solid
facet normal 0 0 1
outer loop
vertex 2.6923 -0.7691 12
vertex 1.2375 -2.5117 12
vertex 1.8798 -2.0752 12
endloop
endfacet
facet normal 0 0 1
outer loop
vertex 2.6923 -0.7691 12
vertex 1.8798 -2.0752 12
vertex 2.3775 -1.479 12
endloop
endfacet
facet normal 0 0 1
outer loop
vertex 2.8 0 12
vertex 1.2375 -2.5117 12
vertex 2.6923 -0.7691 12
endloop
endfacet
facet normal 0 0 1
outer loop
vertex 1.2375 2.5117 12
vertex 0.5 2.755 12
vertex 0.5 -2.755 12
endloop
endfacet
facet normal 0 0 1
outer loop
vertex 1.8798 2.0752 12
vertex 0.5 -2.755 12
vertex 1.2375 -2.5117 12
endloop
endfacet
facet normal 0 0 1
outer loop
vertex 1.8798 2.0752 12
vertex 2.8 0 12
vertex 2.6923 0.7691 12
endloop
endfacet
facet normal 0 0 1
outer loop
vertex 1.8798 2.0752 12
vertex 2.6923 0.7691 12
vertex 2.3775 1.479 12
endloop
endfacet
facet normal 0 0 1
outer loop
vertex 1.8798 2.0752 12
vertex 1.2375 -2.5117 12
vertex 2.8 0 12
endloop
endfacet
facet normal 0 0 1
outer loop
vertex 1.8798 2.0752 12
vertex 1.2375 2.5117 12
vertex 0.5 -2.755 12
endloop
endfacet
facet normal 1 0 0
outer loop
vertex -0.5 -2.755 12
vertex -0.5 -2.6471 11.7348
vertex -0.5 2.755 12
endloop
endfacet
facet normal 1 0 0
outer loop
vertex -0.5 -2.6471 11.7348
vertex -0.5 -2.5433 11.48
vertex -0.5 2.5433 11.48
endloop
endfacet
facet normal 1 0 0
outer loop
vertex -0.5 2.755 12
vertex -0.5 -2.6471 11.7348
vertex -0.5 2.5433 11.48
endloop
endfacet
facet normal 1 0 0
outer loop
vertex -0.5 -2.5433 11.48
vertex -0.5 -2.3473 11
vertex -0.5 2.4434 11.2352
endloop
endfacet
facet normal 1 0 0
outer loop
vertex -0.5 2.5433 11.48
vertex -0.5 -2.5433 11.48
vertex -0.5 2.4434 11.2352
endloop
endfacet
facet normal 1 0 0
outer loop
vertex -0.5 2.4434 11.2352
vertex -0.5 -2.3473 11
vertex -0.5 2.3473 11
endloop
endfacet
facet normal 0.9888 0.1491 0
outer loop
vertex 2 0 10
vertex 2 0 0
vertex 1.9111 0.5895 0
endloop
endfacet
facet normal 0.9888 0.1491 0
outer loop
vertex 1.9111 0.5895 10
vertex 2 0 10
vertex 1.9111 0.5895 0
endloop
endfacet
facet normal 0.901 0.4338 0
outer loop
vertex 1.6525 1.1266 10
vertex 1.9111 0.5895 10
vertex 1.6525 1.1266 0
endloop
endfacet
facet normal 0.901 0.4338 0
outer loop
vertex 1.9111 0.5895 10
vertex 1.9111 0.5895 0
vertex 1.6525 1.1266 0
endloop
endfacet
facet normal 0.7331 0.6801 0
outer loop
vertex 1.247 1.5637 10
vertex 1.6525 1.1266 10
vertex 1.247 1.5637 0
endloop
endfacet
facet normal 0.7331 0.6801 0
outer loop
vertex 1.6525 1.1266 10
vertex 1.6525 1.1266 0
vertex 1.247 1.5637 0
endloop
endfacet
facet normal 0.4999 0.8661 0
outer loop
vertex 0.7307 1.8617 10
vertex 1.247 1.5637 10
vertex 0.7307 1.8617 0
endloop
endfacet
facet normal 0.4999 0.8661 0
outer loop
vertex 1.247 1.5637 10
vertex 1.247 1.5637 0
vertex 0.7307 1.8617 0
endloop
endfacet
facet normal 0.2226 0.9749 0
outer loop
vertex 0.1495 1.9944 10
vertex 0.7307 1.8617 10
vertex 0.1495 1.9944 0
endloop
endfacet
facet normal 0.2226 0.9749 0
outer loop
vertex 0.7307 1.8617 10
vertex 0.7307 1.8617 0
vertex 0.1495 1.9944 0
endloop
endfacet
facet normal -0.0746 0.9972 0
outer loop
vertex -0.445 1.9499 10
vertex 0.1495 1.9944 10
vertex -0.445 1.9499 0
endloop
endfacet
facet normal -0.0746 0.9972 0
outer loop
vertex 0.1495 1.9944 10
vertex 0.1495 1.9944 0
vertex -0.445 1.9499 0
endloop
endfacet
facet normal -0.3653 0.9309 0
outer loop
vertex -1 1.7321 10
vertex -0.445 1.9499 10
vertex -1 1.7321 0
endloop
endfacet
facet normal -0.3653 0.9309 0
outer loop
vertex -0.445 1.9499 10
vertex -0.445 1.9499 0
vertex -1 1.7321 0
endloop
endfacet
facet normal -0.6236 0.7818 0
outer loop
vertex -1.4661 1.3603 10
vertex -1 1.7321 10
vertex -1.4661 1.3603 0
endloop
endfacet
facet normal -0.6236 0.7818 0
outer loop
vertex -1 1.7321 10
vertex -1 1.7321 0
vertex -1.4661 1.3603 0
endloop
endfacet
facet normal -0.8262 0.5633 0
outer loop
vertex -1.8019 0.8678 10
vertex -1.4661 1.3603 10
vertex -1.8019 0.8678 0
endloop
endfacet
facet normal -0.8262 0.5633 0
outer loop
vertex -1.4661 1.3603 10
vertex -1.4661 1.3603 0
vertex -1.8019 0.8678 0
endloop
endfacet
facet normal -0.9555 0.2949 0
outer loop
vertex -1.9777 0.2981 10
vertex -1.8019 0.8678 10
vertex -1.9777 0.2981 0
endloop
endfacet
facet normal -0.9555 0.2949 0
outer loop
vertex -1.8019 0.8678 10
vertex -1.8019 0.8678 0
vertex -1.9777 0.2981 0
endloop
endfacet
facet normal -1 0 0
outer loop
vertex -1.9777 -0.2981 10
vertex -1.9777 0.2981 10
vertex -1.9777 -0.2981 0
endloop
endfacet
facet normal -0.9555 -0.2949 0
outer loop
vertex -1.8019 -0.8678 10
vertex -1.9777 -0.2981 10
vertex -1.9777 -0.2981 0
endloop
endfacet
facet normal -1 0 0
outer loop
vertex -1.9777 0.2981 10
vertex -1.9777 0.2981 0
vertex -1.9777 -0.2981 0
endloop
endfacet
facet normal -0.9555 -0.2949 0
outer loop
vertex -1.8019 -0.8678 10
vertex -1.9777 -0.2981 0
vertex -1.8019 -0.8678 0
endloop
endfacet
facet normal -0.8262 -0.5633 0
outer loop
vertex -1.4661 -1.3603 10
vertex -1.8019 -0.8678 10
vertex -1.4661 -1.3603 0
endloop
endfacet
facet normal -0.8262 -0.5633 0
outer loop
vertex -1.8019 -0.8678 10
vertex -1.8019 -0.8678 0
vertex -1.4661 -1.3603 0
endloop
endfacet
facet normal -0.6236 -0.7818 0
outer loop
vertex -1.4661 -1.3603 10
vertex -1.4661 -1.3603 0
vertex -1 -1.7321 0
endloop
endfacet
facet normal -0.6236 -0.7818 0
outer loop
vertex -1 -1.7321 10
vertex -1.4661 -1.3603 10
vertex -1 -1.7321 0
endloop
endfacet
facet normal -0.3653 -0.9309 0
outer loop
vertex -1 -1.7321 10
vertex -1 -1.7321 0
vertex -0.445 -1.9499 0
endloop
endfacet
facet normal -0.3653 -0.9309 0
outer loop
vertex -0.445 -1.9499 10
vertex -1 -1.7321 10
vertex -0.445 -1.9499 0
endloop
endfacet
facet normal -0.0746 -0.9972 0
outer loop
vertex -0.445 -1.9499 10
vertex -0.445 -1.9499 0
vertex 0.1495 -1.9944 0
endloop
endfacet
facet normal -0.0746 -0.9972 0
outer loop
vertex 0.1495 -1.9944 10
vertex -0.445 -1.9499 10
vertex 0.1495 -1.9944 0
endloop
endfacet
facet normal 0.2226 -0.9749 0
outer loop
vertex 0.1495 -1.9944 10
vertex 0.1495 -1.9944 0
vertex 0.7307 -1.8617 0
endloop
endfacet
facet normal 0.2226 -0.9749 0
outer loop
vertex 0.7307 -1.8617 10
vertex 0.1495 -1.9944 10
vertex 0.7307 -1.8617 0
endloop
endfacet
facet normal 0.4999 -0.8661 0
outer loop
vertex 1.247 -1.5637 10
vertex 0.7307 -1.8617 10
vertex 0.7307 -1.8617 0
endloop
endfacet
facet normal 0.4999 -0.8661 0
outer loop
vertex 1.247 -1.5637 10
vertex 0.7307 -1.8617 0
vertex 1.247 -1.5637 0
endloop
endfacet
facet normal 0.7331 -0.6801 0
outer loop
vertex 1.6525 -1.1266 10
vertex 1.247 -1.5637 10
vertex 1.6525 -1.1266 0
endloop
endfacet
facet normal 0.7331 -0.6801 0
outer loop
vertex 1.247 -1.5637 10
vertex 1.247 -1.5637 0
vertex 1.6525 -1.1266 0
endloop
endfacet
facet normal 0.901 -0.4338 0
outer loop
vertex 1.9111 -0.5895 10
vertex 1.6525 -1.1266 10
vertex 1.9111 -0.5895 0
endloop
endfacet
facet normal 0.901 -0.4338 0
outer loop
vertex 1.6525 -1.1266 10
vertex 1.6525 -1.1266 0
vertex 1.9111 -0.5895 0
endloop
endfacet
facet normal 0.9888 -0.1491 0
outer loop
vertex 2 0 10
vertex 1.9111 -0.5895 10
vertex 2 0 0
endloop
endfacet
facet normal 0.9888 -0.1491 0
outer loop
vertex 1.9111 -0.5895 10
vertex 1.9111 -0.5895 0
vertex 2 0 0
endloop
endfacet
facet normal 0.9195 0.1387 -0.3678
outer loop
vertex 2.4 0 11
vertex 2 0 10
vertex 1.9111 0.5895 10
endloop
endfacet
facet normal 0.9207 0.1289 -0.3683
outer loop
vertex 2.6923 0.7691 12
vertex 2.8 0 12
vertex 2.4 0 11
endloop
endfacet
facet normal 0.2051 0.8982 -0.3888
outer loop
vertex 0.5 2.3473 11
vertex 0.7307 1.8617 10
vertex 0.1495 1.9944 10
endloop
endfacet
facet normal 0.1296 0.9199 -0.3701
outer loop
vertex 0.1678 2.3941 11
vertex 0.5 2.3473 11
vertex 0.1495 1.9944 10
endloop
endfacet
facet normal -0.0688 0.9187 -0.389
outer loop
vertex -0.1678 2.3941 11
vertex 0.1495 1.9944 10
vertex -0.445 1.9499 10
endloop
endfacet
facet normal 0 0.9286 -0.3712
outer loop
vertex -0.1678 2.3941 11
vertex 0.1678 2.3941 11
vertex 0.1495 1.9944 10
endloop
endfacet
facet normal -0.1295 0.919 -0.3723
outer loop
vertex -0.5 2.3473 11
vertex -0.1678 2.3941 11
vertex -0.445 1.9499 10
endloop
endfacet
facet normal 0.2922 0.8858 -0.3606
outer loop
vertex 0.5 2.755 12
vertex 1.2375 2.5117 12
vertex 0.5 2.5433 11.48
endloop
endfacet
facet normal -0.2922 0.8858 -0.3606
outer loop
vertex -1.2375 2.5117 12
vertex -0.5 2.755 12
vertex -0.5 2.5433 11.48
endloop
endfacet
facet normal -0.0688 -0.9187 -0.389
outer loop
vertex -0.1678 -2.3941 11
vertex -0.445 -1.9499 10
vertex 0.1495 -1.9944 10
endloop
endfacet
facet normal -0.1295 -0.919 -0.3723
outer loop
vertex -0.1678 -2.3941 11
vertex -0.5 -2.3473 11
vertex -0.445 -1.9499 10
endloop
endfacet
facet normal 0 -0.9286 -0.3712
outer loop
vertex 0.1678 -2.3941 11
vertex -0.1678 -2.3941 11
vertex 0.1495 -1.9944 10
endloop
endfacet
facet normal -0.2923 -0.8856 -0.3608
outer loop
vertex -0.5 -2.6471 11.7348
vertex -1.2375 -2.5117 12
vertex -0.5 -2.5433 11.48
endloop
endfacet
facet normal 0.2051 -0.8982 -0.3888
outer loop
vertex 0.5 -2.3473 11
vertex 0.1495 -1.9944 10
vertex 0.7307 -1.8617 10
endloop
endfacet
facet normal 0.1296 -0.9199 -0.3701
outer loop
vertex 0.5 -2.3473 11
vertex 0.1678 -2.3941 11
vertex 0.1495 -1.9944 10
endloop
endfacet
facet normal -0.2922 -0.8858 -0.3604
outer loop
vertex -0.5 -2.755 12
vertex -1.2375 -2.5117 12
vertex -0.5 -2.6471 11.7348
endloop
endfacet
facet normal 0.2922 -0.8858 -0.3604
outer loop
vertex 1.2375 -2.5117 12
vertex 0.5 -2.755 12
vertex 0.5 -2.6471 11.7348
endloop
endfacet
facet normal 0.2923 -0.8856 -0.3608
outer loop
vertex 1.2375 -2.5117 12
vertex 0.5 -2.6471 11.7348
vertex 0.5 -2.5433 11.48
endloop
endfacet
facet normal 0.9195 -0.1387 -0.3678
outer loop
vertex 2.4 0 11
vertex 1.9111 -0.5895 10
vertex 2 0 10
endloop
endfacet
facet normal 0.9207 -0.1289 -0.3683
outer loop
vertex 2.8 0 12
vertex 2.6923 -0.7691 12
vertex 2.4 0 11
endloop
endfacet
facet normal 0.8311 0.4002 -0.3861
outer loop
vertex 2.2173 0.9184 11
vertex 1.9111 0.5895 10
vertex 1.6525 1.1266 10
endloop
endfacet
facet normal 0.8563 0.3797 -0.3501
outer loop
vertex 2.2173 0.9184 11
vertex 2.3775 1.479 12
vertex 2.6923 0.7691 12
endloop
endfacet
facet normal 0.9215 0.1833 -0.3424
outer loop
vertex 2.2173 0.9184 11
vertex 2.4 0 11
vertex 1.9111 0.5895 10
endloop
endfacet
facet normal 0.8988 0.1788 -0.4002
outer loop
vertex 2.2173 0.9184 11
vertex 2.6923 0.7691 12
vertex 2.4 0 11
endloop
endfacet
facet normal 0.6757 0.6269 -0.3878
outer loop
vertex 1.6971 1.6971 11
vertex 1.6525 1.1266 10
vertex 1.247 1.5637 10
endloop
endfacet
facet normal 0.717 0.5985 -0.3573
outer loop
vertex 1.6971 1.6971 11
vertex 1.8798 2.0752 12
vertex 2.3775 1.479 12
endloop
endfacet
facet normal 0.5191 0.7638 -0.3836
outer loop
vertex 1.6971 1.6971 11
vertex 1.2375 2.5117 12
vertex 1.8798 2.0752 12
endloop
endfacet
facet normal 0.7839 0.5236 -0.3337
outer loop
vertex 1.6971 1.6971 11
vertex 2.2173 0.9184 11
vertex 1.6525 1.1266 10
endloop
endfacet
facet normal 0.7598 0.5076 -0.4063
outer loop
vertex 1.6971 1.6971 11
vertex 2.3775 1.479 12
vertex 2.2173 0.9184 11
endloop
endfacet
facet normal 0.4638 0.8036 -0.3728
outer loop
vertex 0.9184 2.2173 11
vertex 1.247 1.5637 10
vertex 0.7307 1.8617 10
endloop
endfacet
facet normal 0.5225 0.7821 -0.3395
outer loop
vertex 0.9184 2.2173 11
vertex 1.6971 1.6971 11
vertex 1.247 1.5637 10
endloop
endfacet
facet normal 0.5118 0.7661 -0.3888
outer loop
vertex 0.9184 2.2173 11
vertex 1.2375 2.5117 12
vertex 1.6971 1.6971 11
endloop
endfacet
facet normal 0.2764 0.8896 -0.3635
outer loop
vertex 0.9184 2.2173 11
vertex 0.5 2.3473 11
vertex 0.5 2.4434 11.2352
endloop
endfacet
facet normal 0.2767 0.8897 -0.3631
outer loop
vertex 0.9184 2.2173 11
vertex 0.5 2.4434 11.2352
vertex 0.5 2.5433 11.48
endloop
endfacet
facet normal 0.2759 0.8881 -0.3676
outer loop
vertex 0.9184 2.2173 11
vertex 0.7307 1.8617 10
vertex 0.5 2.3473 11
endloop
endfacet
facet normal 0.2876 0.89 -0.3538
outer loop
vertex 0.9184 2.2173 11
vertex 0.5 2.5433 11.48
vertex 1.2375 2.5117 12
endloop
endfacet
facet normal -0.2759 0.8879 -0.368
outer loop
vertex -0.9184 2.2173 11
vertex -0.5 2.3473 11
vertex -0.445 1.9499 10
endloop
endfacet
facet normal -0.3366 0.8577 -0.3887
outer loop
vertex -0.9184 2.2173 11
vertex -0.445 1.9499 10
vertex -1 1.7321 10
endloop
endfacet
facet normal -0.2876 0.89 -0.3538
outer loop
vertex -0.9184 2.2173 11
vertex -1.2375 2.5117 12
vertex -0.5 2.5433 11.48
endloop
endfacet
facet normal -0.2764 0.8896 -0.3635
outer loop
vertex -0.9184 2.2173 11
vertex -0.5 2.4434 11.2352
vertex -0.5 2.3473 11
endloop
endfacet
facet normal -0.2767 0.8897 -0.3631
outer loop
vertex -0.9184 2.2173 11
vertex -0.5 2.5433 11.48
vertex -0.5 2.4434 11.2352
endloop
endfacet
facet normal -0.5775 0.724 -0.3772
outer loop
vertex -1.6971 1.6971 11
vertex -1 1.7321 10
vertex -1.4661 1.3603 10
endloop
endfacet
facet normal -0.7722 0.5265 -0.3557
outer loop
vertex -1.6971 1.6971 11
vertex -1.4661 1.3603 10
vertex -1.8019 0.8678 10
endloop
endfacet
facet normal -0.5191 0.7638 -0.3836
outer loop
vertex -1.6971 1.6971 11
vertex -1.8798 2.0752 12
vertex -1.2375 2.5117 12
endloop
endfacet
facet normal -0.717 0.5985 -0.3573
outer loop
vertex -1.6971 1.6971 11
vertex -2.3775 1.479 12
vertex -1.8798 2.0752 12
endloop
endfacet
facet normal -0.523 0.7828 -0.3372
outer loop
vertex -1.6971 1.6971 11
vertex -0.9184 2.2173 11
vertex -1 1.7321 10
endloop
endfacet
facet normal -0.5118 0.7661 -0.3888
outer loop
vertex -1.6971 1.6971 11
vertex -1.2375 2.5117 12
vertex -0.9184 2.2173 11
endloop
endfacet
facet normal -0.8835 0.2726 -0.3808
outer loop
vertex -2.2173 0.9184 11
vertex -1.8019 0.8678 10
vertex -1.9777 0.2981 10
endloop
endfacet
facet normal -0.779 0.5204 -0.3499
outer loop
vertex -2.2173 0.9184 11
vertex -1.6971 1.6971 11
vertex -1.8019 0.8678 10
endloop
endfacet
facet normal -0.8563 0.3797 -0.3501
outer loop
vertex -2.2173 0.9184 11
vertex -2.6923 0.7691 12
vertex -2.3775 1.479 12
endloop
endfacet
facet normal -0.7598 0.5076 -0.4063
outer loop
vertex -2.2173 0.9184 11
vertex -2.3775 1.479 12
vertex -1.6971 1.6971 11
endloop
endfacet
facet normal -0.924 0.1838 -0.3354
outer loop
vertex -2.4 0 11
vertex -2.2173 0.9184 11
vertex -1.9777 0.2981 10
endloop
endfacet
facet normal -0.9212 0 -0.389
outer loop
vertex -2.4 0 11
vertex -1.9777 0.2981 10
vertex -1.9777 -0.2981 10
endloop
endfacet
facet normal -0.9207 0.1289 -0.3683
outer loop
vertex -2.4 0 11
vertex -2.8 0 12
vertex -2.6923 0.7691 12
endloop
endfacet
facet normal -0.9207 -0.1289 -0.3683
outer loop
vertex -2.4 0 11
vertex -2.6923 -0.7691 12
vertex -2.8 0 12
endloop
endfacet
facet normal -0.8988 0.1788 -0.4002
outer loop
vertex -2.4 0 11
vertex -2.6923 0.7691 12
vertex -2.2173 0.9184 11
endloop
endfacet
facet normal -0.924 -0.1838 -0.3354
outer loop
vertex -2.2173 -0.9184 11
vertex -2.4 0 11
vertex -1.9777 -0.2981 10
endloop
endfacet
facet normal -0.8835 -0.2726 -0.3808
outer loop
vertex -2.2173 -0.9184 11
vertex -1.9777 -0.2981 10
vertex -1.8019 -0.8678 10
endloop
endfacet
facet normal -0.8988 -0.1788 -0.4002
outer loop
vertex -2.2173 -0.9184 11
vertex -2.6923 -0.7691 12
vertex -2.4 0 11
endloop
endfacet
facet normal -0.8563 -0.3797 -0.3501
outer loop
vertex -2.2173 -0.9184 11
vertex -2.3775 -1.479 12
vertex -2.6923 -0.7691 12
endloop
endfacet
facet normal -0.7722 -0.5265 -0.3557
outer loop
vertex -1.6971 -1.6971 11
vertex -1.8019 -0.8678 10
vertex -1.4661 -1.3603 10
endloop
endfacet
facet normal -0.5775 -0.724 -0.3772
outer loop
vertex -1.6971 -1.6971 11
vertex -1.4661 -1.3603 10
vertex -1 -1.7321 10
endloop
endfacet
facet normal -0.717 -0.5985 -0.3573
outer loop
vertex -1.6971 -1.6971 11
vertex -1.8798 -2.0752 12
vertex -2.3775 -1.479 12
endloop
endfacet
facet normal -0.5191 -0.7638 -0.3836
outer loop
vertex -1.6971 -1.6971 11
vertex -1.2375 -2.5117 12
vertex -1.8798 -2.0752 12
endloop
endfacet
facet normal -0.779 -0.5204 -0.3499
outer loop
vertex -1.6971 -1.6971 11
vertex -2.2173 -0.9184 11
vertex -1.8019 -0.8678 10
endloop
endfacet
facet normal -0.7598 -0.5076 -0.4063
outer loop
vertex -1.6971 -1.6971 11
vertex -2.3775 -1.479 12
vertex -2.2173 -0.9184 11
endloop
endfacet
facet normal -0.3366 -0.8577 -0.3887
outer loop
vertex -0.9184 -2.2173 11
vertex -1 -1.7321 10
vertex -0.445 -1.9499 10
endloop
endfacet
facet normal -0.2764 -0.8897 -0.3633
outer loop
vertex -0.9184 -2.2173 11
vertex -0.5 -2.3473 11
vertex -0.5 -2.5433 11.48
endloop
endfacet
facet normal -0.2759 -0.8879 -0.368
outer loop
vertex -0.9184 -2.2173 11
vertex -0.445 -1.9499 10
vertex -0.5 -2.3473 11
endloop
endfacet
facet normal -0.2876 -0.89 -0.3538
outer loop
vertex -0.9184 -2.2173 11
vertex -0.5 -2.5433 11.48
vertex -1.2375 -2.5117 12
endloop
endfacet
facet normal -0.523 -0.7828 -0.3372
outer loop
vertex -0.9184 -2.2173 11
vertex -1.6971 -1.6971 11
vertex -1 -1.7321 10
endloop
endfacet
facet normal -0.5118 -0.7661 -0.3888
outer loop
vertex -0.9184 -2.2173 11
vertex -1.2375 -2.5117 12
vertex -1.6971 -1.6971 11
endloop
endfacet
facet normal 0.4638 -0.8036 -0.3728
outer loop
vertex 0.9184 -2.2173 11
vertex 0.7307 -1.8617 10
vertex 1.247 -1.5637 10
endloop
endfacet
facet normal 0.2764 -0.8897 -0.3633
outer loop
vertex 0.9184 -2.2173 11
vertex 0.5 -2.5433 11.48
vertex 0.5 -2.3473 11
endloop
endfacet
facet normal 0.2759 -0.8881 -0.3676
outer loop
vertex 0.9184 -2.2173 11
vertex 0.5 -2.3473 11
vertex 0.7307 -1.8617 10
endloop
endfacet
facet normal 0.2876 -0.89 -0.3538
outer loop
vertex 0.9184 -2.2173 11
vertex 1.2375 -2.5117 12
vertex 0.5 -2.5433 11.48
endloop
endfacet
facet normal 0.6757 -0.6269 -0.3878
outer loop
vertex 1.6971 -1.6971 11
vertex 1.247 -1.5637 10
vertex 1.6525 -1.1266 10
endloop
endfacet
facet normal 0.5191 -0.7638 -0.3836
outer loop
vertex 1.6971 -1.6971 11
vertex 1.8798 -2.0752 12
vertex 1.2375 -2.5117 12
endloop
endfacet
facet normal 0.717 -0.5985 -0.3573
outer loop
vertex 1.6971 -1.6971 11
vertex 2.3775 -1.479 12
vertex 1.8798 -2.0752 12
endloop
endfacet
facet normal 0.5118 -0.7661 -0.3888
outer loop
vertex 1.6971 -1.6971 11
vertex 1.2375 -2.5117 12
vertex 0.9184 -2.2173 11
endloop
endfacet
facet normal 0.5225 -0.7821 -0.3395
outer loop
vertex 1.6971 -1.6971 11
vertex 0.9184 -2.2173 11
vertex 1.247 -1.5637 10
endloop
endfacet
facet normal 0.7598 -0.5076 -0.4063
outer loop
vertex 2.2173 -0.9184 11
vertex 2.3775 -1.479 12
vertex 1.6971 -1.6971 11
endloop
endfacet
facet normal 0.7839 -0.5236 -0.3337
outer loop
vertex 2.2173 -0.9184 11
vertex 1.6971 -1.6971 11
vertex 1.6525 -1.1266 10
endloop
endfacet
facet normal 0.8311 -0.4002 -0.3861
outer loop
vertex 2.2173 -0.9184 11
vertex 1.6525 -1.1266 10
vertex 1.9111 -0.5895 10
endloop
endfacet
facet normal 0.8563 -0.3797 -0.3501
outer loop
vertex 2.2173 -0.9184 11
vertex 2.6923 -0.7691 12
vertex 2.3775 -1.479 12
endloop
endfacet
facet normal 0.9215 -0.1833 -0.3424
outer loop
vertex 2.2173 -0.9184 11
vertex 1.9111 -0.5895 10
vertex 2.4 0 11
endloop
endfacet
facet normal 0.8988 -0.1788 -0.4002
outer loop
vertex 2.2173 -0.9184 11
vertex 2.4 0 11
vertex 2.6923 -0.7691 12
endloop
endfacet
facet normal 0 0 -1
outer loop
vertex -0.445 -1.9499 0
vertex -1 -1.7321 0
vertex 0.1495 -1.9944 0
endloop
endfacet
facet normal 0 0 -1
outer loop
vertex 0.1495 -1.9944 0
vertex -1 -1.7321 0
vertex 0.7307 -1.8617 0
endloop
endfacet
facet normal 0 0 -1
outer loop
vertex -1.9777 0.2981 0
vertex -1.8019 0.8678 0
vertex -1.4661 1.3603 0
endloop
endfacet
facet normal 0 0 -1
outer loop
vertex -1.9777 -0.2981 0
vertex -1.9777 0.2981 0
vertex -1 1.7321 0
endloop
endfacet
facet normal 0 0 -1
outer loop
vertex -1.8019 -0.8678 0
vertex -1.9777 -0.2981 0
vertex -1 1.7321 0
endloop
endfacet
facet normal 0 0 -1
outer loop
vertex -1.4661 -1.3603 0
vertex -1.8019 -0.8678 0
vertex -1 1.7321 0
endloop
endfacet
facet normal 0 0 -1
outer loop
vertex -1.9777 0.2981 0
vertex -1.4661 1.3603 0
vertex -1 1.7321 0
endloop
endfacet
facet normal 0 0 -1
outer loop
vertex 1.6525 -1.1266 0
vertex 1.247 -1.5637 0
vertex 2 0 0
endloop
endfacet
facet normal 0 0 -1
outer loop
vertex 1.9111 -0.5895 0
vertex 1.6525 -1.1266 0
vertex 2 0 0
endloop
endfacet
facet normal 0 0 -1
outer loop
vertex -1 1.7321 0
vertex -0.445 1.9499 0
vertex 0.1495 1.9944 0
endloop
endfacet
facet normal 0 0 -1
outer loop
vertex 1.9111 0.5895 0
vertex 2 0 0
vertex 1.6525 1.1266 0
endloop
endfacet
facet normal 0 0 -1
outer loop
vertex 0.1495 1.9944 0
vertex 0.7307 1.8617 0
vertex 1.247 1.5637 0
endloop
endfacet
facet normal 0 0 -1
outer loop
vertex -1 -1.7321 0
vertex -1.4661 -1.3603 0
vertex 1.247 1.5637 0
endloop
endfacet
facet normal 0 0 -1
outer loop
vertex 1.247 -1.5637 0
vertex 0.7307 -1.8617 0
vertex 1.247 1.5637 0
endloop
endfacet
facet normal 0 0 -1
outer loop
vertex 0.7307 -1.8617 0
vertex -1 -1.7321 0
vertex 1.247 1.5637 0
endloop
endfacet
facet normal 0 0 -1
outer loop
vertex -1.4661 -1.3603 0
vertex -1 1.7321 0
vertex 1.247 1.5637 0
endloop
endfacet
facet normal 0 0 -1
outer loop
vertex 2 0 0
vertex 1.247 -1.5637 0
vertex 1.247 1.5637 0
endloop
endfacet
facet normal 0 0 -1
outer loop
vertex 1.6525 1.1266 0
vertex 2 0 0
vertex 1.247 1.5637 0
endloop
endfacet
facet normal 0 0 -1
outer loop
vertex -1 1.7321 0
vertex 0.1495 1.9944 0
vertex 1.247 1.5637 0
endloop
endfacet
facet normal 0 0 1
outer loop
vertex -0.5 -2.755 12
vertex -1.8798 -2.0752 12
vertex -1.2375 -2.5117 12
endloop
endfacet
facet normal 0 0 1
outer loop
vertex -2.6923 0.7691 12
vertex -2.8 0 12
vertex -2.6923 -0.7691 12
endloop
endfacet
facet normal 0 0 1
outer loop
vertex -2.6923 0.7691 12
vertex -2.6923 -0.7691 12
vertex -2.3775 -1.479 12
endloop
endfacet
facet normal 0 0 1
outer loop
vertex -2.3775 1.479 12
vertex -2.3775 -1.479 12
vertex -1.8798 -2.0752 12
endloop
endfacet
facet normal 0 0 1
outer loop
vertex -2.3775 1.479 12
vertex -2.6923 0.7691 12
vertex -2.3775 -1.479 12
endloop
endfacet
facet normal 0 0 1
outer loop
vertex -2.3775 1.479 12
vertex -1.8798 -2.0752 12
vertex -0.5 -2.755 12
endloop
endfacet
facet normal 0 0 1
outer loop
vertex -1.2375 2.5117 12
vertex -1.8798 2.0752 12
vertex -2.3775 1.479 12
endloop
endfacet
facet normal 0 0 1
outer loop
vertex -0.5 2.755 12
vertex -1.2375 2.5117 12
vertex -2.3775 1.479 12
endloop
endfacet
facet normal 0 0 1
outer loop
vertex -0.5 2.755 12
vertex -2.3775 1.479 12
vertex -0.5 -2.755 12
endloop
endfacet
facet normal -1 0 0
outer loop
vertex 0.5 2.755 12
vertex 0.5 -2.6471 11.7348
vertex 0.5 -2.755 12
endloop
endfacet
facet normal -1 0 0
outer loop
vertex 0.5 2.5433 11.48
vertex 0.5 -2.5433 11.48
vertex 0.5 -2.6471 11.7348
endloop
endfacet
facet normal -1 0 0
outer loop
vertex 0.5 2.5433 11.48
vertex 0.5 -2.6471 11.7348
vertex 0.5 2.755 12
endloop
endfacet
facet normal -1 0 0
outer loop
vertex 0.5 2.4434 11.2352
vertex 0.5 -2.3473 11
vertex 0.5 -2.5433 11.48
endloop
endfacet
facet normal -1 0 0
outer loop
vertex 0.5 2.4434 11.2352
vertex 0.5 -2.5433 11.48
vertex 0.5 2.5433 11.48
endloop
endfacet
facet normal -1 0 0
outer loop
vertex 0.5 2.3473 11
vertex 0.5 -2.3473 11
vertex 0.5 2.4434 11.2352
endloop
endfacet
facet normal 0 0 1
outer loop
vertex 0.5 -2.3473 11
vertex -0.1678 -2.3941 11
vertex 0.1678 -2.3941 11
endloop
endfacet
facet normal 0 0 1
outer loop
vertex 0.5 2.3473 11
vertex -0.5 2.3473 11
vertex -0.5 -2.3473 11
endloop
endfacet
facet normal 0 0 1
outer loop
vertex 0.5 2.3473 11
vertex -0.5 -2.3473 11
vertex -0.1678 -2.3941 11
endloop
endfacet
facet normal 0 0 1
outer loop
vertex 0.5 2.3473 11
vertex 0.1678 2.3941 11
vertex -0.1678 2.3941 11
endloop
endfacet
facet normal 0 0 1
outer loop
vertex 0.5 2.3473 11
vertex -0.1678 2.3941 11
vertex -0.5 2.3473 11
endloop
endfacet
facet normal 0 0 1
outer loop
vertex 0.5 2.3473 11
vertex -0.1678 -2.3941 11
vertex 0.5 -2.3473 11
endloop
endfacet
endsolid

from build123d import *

# Parameters (mm, degrees)
BOX_W          = 1
BOX_H          = 10
BOX_DEPTH      = 4
CYLINDER_R     = 2
CYLINDER_DEPTH = 10


with BuildPart() as cub:
    # Box → Box (new body)
    with BuildSketch(Plane(origin=(-0.5, -6, 11), x_dir=(1, 0, 0), z_dir=(0, 0, 1))):
        with Locations((0.5, 5)):
            Rectangle(BOX_W, BOX_H)
    extrude(amount=BOX_DEPTH)


with BuildPart() as cilindre:
    # Cylinder → Cylinder (new body)
    with BuildSketch(Plane.XY):
        Circle(CYLINDER_R)
    extrude(amount=CYLINDER_DEPTH)


with BuildPart() as cut:
    # Cone → Cone (revolve)
    with BuildSketch(Plane(origin=(0, 0, 10), x_dir=(1, 0, 0), z_dir=(0, -1, 0))):
        Polygon((0, 0), (2, 0), (2.8, 2), (0, 2), align=None)
    revolve(axis=Axis((0, 0, 10), (0, 0, 1)))

    # Fusion: union Cilindre
    add(cilindre.part)

    # Cut: cut Cub
    add(cub.part, mode=Mode.SUBTRACT)


solid = cut.part
